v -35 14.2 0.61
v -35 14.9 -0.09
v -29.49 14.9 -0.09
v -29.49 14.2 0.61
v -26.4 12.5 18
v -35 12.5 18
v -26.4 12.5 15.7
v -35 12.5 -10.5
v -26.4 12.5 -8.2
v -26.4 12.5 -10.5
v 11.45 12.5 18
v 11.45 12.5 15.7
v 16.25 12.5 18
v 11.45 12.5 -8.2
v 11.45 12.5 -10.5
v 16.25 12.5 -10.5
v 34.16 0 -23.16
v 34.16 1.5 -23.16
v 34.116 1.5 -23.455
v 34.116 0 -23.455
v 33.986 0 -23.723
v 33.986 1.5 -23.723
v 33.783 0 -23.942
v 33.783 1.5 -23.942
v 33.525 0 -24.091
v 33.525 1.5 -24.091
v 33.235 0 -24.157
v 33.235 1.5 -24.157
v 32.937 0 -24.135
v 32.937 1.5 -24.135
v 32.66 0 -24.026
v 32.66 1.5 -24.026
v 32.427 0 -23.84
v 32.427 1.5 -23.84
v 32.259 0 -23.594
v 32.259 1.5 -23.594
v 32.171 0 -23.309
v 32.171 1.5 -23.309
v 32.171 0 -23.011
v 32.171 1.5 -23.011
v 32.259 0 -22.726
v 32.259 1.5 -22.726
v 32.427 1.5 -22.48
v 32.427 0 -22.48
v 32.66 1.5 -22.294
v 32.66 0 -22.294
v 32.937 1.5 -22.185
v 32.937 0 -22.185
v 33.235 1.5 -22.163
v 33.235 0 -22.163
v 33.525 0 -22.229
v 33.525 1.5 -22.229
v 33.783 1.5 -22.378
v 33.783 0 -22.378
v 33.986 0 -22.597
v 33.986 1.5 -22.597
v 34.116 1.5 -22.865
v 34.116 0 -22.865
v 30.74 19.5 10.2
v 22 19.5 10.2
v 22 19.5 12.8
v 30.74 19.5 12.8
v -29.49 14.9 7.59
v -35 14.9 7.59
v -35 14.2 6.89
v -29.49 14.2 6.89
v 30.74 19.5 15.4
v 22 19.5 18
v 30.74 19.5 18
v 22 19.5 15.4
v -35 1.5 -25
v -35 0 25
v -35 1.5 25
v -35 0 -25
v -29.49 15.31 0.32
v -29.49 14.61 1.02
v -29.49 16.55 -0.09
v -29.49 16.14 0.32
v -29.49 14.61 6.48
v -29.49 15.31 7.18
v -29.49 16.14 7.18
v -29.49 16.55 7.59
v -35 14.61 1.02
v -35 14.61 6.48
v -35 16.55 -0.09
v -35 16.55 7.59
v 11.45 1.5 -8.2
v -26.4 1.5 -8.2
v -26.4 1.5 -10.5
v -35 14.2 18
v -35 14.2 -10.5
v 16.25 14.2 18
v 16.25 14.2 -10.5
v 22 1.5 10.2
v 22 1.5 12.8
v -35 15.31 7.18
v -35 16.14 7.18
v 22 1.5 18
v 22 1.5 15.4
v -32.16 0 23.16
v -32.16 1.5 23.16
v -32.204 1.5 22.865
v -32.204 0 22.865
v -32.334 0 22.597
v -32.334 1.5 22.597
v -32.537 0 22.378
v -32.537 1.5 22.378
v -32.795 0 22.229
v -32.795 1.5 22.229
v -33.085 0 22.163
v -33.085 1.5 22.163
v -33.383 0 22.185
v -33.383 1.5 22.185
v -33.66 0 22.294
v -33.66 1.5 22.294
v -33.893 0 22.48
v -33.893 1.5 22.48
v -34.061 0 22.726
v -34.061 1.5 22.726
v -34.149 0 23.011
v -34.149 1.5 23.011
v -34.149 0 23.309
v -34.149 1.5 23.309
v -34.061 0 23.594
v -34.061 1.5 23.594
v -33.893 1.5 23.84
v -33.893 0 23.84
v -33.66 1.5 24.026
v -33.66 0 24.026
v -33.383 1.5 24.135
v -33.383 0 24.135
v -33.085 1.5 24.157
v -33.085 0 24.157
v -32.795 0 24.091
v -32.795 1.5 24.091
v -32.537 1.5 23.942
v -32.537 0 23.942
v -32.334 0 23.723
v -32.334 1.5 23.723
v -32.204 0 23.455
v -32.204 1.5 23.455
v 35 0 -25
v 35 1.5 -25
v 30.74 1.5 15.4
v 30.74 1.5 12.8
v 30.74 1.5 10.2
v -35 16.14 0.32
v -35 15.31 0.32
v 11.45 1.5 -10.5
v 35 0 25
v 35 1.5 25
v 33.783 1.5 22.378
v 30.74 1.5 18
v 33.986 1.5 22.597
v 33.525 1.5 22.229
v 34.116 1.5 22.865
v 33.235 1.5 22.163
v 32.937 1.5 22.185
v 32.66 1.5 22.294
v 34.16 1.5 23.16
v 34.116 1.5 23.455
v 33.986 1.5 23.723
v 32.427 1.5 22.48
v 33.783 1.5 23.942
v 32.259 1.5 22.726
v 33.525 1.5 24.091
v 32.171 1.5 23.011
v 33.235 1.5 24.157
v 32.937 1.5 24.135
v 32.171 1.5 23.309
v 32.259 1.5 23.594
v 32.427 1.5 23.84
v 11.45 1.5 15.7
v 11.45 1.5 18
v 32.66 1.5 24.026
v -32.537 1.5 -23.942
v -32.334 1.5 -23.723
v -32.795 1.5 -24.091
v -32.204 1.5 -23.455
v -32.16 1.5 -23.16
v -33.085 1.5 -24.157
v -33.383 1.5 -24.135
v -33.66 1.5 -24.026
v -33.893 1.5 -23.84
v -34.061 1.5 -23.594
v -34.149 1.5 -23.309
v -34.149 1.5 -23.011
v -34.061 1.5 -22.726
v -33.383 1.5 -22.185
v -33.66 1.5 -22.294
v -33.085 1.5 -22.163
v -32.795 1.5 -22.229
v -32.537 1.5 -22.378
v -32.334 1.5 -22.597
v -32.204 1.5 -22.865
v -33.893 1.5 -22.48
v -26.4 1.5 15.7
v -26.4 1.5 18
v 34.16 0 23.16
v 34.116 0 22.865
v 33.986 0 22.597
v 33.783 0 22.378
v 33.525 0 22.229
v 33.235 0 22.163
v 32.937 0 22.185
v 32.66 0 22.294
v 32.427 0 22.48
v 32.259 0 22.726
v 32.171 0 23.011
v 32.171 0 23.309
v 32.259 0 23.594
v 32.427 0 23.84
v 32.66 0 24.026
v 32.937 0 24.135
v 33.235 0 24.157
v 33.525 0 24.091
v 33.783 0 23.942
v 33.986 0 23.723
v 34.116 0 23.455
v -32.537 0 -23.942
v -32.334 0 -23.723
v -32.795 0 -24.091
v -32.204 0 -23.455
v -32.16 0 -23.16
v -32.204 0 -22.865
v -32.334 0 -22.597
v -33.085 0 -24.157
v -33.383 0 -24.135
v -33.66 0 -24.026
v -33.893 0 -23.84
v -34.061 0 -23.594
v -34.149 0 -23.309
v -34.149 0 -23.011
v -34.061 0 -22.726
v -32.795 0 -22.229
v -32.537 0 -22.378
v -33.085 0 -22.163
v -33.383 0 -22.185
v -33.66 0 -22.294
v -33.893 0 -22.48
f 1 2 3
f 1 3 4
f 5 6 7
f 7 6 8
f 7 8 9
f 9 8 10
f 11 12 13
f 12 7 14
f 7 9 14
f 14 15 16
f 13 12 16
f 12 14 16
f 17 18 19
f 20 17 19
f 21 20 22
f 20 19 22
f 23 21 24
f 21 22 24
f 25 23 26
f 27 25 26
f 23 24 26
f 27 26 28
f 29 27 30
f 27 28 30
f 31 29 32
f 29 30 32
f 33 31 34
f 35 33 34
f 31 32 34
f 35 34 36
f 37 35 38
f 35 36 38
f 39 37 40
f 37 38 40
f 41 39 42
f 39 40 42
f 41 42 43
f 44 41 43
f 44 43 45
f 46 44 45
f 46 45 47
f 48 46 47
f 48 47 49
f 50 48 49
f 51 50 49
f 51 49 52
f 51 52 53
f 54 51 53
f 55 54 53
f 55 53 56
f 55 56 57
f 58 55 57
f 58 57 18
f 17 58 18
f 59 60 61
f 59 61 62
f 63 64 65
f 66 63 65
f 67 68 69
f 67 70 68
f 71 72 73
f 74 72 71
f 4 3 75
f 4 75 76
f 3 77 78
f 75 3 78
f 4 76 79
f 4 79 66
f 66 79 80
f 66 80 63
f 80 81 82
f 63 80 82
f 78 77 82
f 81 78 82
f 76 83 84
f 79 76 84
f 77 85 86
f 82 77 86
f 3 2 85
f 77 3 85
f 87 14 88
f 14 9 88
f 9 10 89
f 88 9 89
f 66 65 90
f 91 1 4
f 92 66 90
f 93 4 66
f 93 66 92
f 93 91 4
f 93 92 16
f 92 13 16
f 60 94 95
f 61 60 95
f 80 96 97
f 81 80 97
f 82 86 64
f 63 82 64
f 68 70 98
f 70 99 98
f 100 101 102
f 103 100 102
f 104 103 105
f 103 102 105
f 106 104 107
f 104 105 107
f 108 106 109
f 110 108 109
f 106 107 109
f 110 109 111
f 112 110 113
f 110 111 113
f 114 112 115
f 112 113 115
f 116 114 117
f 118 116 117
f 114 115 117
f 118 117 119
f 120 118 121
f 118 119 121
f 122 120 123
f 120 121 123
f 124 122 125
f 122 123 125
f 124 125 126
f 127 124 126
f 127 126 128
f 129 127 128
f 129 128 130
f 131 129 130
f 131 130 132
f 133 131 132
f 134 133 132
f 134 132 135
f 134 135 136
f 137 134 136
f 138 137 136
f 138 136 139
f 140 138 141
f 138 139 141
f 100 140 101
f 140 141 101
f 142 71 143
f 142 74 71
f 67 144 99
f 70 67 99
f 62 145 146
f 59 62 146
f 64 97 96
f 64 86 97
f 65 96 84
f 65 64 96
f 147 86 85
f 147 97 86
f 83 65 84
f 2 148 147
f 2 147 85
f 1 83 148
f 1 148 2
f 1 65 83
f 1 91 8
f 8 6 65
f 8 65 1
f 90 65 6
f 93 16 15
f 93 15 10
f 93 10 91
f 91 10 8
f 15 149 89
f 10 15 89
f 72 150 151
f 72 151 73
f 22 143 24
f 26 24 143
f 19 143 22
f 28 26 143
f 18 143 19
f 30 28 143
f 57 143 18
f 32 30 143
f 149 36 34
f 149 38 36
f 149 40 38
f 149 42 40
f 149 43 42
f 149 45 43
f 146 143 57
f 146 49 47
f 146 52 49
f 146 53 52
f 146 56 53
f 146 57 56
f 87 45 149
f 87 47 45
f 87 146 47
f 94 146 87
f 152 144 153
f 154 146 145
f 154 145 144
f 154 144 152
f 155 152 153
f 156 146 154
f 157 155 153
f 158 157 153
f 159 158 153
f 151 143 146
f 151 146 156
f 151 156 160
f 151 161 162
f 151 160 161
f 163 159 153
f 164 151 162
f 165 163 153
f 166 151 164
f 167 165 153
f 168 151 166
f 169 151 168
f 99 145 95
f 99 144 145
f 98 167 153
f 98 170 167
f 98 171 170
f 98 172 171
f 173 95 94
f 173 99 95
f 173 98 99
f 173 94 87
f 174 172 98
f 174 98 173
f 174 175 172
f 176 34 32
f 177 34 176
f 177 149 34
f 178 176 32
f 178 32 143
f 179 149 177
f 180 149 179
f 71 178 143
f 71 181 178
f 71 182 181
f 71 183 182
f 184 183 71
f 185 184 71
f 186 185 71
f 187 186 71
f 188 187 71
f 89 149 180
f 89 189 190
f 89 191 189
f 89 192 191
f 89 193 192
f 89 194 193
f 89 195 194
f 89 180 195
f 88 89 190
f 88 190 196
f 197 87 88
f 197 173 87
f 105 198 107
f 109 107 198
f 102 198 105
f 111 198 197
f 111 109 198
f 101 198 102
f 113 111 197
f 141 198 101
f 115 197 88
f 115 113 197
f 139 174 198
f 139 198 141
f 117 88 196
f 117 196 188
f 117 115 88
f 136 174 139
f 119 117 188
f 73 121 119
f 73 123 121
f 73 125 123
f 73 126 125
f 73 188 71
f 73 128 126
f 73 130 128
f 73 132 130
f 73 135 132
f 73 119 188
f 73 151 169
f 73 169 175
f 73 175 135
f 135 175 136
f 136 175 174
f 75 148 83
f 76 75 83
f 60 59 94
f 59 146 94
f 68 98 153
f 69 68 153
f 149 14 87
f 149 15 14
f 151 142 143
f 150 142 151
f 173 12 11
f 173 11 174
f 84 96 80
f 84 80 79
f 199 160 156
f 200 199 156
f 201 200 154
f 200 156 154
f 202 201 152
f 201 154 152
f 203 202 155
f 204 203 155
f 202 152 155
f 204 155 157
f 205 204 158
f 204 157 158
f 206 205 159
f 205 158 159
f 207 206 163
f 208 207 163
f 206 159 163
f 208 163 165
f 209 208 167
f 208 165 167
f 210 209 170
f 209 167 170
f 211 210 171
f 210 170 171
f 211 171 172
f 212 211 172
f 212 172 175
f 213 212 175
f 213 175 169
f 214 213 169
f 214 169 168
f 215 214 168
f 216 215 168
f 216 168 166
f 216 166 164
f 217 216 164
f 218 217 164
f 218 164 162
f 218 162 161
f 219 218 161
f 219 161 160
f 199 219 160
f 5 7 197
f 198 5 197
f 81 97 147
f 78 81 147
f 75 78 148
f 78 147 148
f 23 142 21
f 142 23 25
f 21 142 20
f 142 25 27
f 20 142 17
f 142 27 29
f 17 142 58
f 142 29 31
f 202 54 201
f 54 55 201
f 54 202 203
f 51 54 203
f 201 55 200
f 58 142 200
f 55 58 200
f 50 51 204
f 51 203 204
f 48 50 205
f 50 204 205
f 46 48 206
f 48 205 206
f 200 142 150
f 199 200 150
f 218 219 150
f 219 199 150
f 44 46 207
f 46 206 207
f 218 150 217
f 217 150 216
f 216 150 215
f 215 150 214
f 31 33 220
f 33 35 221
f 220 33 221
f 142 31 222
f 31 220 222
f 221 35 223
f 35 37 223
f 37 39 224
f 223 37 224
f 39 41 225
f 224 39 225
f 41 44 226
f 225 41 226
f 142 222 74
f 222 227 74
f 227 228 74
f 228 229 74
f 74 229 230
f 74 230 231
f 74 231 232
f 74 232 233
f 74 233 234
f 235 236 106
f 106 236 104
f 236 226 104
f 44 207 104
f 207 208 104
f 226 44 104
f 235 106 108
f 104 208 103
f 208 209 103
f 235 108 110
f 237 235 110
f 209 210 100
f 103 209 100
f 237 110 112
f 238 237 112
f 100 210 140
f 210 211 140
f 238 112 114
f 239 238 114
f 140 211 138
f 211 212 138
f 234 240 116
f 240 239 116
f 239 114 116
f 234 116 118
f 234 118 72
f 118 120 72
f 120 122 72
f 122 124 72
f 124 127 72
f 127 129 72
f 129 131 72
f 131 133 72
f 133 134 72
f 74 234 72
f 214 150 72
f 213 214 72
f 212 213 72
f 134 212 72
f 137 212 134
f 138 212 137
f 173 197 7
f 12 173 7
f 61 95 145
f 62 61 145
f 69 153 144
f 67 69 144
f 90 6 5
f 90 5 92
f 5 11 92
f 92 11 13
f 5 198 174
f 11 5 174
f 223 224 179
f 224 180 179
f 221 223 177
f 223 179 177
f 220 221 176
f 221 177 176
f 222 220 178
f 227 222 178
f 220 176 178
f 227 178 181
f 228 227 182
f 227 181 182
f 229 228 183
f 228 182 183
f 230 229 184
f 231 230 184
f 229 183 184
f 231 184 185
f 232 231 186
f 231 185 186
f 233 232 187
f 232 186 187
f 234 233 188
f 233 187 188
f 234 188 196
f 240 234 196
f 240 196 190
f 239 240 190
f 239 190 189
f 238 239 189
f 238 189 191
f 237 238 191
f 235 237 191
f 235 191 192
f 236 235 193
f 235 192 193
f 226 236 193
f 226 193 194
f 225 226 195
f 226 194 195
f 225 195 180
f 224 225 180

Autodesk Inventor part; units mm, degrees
ref_plane "YZ Plane" through (0, 0, 0) normal (1, 0, 0) x (0, 1, 0)
ref_plane "XZ Plane" through (0, 0, 0) normal (0, 1, 0) x (-1, 0, 0)
ref_plane "XY Plane" through (0, 0, 0) normal (0, 0, 1) x (1, 0, 0)
sketch "Sketch1" plane through (0, 0, 0) normal (0, 1, 0) x (-1, 0, 0)
  line L0 (-35, 25) -> (35, 25)
  line L1 (35, 25) -> (35, -25)
  line L2 (35, -25) -> (-35, -25)
  line L3 (-35, -25) -> (-35, 25)
  line L4 (-35, 25) -> (35, -25) construction
  line L5 (35, 25) -> (-35, -25) construction
  point P0 (0, 0)
  dimension "d0" = 70
  dimension "d1" = 50
extrude "Extrusion1" add sketch "Sketch1" along normal blind 1.5
sketch "Sketch4" plane through (0, 1.5, 0) normal (0, 1, 0) x (1, 0, 0)
  line L0 (16.25, 10.5) -> (-35, 10.5)
  line L1 (-35, 10.5) -> (-35, -18)
  line L2 (-35, -18) -> (16.25, -18)
  line L3 (16.25, -18) -> (16.25, 10.5)
  line L4 (16.25, 10.5) -> (-35, -18) construction
  line L5 (-35, 10.5) -> (16.25, -18) construction
  line L6 (-35, -25) -> (35, -25) projected
  line L7 (-35, 25) -> (-35, -25) projected
  dimension "d10" = 51.25
  dimension "d11" = 28.5
  dimension "d12" = 7
extrude "Extrusion3" add sketch "Sketch4" along normal blind 12.7
sketch "Sketch5" plane through (0, 1.5, 0) normal (0, 1, 0) x (1, 0, 0)
  line L0 (30.74, -15.4) -> (22, -15.4)
  line L1 (22, -15.4) -> (22, -18)
  line L2 (22, -18) -> (30.74, -18)
  line L3 (30.74, -18) -> (30.74, -15.4)
  line L4 (30.74, -15.4) -> (22, -18) construction
  line L5 (22, -15.4) -> (30.74, -18) construction
  line L6 (16.25, -18) -> (16.25, 10.5) projected
  line L7 (-35, -18) -> (16.25, -18) projected
  line L8 (30.74, -10.2) -> (22, -10.2)
  line L9 (22, -10.2) -> (22, -12.8)
  line L10 (22, -12.8) -> (30.74, -12.8)
  line L11 (30.74, -12.8) -> (30.74, -10.2)
  line L12 (30.74, -10.2) -> (22, -12.8) construction
  line L13 (22, -10.2) -> (30.74, -12.8) construction
  point P0 (0, 0)
  point P1 (26.37, -16.7)
  point P2 (22, -16.7)
  point P3 (26.37, -11.5)
  point P4 (22, -11.5)
  dimension "d15" = 5.75
  dimension "d16" = 8.74
  dimension "d17" = 2.6
  dimension "d18" = 8.74
  dimension "d19" = 2.6
  dimension "d20" = 2.6
extrude "Extrusion4" add sketch "Sketch5" along normal blind 18
sketch "Sketch6" plane through (-35, 0, -25) normal (-1, 0, 0) x (0, 0, 1)
  line L0 (24.91, 16.55) -> (32.59, 16.55)
  line L1 (32.59, 16.55) -> (32.59, 14.9)
  line L2 (31.89, 14.2) -> (25.61, 14.2)
  line L3 (24.91, 14.9) -> (24.91, 16.55)
  line L4 (24.91, 16.55) -> (32.59, 14.2) construction
  line L5 (32.59, 16.55) -> (24.91, 14.2) construction
  line L6 (43, 1.5) -> (50, 1.5) projected
  line L7 (43, 1.5) -> (43, 14.2) projected
  line L8 (14.5, 1.5) -> (14.5, 14.2) projected
  line L9 (32.18, 16.14) -> (25.32, 16.14)
  line L10 (25.32, 16.14) -> (25.32, 15.31)
  line L11 (26.02, 14.61) -> (31.48, 14.61)
  line L12 (32.18, 15.31) -> (32.18, 16.14)
  line L13 (14.5, 14.2) -> (43, 14.2) projected
  line L14 (25.32, 15.31) -> (26.02, 14.61)
  line L15 (32.18, 15.31) -> (31.48, 14.61)
  line L16 (32.59, 14.9) -> (31.89, 14.2)
  line L17 (24.91, 14.9) -> (25.61, 14.2)
  point P0 (25, 0)
  point P1 (28.75, 15.375)
  point P2 (25.32, 14.61)
  point P3 (32.18, 14.61)
  dimension "d24" = 2.35
  dimension "d25" = 7.68
  dimension "d26" = 14.25
  dimension "d27" = 14.25
  dimension "d28" = 0.41
  dimension "d50" = 0.7
  dimension "d51" = 0.7
  dimension "d52" = 0.7
  dimension "d53" = 0.7
  dimension "d54" = 0.7
  dimension "d55" = 0.7
  dimension "d56" = 0.7
  dimension "d57" = 0.7
extrude "Extrusion5" add sketch "Sketch6" against normal blind 5.51
sketch "Sketch8" plane through (0, 1.5, 0) normal (0, 1, 0) x (1, 0, 0)
  circle A0 centre (33.16, -23.16) radius 1
  circle A1 centre (-33.16, -23.16) radius 1
  circle A2 centre (-33.16, 23.16) radius 1
  circle A3 centre (33.16, 23.16) radius 1
  line L0 (22, -10.2) -> (30.74, -10.2) projected
  line L1 (30.74, -10.2) -> (30.74, -12.8) projected
  line L2 (30.74, -12.8) -> (22, -12.8) projected
  line L3 (22, -12.8) -> (22, -10.2) projected
  line L4 (22, -15.4) -> (30.74, -15.4) projected
  line L5 (30.74, -15.4) -> (30.74, -18) projected
  line L6 (30.74, -18) -> (22, -18) projected
  line L7 (22, -18) -> (22, -15.4) projected
  line L8 (16.25, -18) -> (-35, -18) projected
  line L9 (-35, -18) -> (-35, -25) projected
  line L10 (-35, -25) -> (35, -25) projected
  line L11 (35, -25) -> (35, 25) projected
  line L12 (35, 25) -> (-35, 25) projected
  line L13 (-35, 25) -> (-35, 10.5) projected
  line L14 (-35, 10.5) -> (16.25, 10.5) projected
  line L15 (16.25, 10.5) -> (16.25, -18) projected
  point P0 (0, 0)
  dimension "d33" = 2
  dimension "d34" = 2
  dimension "d35" = 2
  dimension "d36" = 2
  dimension "d37" = 1.84
  dimension "d38" = 1.84
  dimension "d39" = 1.84
  dimension "d40" = 1.84
  dimension "d41" = 1.84
  dimension "d42" = 1.84
  dimension "d43" = 1.84
  dimension "d44" = 1.84
extrude "Extrusion7" cut sketch "Sketch8" against normal blind 10 contours A0 | A1 | A2 | A3
sketch "Sketch9" plane through (-35, 0, -25) normal (-1, 0, 0) x (0, 0, 1)
  line L0 (14.5, 1.5) -> (14.5, 14.2) construction
  line L1 (43, 1.5) -> (43, 19.5) construction
  line L2 (14.5, 14.2) -> (43, 14.2) construction
  line L3 (43, 14.2) -> (43, 1.5) construction
  line L4 (43, 1.5) -> (14.5, 1.5) construction
  line L5 (14.5, 1.5) -> (14.5, 14.2) construction
  line L6 (40.7, 12.5) -> (16.8, 12.5)
  line L7 (16.8, 12.5) -> (16.8, 1.5)
  line L8 (40.7, 1.5) -> (40.7, 12.5)
  line L9 (16.8, 1.5) -> (40.7, 1.5)
  point P0 (25, 0)
  point P1 (14.5, 7.85)
  dimension "d47" = 1.7
  dimension "d64" = 2.3
  dimension "d65" = 2.3
extrude "Extrusion8" cut sketch "Sketch9" against normal up to next
sketch "Sketch10" plane through (16.25, 1.5, -10.5) normal (0, 0, -1) x (-1, 0, 0)
  line L0 (51.25, 0) -> (0, 0) projected
  line L1 (51.25, 0) -> (51.25, 12.7) projected
  line L2 (0, 12.7) -> (51.25, 12.7) projected
  line L3 (0, 0) -> (0, 12.7) projected
  line L4 (51.25, 11) -> (0, 11) projected
  line L5 (51.25, 0) -> (0, 0) projected
  line L6 (51.25, 11) -> (42.65, 11)
  line L7 (42.65, 11) -> (42.65, 0)
  line L8 (42.65, 0) -> (51.25, 0)
  line L9 (51.25, 0) -> (51.25, 11)
  point P0 (16.25, -1.5)
  point P1 (42.65, 0)
  dimension "d58" = 8.6
extrude "Extrusion9" cut sketch "Sketch10" against normal through all contours L0 L7 L4 L1
sketch "Sketch11" plane through (16.25, 14.2, -10.5) normal (0, 0, -1) x (-1, 0, 0)
  line L0 (42.65, -1.7) -> (0, -1.7) projected
  line L1 (42.65, -12.7) -> (0, -12.7) projected
  line L2 (0, -1.7) -> (4.8, -1.7)
  line L3 (4.8, -1.7) -> (4.8, -12.7)
  line L4 (4.8, -12.7) -> (0, -12.7)
  line L5 (0, -12.7) -> (0, -1.7)
  point P0 (16.25, -14.2)
  point P1 (0, -12.7)
  point P2 (4.8, -1.7)
  dimension "d61" = 4.8
extrude "Extrusion10" cut sketch "Sketch11" against normal through all
equation "\"d26\" = d27"
equation "\"d51\" = d50"
equation "\"d52\" = d50"
equation "\"d53\" = d52"
equation "\"d54\" = d50"
equation "\"d55\" = d54"
equation "\"d56\" = d50"
equation "\"d57\" = d56"
equation "\"d38\" = d37"
equation "\"d39\" = d37"
equation "\"d40\" = d37"
equation "\"d41\" = d37"
equation "\"d42\" = d37"
equation "\"d43\" = d37"
equation "\"d44\" = d37"
equation "\"d65\" = d64"
properties part number "PCBModel"
